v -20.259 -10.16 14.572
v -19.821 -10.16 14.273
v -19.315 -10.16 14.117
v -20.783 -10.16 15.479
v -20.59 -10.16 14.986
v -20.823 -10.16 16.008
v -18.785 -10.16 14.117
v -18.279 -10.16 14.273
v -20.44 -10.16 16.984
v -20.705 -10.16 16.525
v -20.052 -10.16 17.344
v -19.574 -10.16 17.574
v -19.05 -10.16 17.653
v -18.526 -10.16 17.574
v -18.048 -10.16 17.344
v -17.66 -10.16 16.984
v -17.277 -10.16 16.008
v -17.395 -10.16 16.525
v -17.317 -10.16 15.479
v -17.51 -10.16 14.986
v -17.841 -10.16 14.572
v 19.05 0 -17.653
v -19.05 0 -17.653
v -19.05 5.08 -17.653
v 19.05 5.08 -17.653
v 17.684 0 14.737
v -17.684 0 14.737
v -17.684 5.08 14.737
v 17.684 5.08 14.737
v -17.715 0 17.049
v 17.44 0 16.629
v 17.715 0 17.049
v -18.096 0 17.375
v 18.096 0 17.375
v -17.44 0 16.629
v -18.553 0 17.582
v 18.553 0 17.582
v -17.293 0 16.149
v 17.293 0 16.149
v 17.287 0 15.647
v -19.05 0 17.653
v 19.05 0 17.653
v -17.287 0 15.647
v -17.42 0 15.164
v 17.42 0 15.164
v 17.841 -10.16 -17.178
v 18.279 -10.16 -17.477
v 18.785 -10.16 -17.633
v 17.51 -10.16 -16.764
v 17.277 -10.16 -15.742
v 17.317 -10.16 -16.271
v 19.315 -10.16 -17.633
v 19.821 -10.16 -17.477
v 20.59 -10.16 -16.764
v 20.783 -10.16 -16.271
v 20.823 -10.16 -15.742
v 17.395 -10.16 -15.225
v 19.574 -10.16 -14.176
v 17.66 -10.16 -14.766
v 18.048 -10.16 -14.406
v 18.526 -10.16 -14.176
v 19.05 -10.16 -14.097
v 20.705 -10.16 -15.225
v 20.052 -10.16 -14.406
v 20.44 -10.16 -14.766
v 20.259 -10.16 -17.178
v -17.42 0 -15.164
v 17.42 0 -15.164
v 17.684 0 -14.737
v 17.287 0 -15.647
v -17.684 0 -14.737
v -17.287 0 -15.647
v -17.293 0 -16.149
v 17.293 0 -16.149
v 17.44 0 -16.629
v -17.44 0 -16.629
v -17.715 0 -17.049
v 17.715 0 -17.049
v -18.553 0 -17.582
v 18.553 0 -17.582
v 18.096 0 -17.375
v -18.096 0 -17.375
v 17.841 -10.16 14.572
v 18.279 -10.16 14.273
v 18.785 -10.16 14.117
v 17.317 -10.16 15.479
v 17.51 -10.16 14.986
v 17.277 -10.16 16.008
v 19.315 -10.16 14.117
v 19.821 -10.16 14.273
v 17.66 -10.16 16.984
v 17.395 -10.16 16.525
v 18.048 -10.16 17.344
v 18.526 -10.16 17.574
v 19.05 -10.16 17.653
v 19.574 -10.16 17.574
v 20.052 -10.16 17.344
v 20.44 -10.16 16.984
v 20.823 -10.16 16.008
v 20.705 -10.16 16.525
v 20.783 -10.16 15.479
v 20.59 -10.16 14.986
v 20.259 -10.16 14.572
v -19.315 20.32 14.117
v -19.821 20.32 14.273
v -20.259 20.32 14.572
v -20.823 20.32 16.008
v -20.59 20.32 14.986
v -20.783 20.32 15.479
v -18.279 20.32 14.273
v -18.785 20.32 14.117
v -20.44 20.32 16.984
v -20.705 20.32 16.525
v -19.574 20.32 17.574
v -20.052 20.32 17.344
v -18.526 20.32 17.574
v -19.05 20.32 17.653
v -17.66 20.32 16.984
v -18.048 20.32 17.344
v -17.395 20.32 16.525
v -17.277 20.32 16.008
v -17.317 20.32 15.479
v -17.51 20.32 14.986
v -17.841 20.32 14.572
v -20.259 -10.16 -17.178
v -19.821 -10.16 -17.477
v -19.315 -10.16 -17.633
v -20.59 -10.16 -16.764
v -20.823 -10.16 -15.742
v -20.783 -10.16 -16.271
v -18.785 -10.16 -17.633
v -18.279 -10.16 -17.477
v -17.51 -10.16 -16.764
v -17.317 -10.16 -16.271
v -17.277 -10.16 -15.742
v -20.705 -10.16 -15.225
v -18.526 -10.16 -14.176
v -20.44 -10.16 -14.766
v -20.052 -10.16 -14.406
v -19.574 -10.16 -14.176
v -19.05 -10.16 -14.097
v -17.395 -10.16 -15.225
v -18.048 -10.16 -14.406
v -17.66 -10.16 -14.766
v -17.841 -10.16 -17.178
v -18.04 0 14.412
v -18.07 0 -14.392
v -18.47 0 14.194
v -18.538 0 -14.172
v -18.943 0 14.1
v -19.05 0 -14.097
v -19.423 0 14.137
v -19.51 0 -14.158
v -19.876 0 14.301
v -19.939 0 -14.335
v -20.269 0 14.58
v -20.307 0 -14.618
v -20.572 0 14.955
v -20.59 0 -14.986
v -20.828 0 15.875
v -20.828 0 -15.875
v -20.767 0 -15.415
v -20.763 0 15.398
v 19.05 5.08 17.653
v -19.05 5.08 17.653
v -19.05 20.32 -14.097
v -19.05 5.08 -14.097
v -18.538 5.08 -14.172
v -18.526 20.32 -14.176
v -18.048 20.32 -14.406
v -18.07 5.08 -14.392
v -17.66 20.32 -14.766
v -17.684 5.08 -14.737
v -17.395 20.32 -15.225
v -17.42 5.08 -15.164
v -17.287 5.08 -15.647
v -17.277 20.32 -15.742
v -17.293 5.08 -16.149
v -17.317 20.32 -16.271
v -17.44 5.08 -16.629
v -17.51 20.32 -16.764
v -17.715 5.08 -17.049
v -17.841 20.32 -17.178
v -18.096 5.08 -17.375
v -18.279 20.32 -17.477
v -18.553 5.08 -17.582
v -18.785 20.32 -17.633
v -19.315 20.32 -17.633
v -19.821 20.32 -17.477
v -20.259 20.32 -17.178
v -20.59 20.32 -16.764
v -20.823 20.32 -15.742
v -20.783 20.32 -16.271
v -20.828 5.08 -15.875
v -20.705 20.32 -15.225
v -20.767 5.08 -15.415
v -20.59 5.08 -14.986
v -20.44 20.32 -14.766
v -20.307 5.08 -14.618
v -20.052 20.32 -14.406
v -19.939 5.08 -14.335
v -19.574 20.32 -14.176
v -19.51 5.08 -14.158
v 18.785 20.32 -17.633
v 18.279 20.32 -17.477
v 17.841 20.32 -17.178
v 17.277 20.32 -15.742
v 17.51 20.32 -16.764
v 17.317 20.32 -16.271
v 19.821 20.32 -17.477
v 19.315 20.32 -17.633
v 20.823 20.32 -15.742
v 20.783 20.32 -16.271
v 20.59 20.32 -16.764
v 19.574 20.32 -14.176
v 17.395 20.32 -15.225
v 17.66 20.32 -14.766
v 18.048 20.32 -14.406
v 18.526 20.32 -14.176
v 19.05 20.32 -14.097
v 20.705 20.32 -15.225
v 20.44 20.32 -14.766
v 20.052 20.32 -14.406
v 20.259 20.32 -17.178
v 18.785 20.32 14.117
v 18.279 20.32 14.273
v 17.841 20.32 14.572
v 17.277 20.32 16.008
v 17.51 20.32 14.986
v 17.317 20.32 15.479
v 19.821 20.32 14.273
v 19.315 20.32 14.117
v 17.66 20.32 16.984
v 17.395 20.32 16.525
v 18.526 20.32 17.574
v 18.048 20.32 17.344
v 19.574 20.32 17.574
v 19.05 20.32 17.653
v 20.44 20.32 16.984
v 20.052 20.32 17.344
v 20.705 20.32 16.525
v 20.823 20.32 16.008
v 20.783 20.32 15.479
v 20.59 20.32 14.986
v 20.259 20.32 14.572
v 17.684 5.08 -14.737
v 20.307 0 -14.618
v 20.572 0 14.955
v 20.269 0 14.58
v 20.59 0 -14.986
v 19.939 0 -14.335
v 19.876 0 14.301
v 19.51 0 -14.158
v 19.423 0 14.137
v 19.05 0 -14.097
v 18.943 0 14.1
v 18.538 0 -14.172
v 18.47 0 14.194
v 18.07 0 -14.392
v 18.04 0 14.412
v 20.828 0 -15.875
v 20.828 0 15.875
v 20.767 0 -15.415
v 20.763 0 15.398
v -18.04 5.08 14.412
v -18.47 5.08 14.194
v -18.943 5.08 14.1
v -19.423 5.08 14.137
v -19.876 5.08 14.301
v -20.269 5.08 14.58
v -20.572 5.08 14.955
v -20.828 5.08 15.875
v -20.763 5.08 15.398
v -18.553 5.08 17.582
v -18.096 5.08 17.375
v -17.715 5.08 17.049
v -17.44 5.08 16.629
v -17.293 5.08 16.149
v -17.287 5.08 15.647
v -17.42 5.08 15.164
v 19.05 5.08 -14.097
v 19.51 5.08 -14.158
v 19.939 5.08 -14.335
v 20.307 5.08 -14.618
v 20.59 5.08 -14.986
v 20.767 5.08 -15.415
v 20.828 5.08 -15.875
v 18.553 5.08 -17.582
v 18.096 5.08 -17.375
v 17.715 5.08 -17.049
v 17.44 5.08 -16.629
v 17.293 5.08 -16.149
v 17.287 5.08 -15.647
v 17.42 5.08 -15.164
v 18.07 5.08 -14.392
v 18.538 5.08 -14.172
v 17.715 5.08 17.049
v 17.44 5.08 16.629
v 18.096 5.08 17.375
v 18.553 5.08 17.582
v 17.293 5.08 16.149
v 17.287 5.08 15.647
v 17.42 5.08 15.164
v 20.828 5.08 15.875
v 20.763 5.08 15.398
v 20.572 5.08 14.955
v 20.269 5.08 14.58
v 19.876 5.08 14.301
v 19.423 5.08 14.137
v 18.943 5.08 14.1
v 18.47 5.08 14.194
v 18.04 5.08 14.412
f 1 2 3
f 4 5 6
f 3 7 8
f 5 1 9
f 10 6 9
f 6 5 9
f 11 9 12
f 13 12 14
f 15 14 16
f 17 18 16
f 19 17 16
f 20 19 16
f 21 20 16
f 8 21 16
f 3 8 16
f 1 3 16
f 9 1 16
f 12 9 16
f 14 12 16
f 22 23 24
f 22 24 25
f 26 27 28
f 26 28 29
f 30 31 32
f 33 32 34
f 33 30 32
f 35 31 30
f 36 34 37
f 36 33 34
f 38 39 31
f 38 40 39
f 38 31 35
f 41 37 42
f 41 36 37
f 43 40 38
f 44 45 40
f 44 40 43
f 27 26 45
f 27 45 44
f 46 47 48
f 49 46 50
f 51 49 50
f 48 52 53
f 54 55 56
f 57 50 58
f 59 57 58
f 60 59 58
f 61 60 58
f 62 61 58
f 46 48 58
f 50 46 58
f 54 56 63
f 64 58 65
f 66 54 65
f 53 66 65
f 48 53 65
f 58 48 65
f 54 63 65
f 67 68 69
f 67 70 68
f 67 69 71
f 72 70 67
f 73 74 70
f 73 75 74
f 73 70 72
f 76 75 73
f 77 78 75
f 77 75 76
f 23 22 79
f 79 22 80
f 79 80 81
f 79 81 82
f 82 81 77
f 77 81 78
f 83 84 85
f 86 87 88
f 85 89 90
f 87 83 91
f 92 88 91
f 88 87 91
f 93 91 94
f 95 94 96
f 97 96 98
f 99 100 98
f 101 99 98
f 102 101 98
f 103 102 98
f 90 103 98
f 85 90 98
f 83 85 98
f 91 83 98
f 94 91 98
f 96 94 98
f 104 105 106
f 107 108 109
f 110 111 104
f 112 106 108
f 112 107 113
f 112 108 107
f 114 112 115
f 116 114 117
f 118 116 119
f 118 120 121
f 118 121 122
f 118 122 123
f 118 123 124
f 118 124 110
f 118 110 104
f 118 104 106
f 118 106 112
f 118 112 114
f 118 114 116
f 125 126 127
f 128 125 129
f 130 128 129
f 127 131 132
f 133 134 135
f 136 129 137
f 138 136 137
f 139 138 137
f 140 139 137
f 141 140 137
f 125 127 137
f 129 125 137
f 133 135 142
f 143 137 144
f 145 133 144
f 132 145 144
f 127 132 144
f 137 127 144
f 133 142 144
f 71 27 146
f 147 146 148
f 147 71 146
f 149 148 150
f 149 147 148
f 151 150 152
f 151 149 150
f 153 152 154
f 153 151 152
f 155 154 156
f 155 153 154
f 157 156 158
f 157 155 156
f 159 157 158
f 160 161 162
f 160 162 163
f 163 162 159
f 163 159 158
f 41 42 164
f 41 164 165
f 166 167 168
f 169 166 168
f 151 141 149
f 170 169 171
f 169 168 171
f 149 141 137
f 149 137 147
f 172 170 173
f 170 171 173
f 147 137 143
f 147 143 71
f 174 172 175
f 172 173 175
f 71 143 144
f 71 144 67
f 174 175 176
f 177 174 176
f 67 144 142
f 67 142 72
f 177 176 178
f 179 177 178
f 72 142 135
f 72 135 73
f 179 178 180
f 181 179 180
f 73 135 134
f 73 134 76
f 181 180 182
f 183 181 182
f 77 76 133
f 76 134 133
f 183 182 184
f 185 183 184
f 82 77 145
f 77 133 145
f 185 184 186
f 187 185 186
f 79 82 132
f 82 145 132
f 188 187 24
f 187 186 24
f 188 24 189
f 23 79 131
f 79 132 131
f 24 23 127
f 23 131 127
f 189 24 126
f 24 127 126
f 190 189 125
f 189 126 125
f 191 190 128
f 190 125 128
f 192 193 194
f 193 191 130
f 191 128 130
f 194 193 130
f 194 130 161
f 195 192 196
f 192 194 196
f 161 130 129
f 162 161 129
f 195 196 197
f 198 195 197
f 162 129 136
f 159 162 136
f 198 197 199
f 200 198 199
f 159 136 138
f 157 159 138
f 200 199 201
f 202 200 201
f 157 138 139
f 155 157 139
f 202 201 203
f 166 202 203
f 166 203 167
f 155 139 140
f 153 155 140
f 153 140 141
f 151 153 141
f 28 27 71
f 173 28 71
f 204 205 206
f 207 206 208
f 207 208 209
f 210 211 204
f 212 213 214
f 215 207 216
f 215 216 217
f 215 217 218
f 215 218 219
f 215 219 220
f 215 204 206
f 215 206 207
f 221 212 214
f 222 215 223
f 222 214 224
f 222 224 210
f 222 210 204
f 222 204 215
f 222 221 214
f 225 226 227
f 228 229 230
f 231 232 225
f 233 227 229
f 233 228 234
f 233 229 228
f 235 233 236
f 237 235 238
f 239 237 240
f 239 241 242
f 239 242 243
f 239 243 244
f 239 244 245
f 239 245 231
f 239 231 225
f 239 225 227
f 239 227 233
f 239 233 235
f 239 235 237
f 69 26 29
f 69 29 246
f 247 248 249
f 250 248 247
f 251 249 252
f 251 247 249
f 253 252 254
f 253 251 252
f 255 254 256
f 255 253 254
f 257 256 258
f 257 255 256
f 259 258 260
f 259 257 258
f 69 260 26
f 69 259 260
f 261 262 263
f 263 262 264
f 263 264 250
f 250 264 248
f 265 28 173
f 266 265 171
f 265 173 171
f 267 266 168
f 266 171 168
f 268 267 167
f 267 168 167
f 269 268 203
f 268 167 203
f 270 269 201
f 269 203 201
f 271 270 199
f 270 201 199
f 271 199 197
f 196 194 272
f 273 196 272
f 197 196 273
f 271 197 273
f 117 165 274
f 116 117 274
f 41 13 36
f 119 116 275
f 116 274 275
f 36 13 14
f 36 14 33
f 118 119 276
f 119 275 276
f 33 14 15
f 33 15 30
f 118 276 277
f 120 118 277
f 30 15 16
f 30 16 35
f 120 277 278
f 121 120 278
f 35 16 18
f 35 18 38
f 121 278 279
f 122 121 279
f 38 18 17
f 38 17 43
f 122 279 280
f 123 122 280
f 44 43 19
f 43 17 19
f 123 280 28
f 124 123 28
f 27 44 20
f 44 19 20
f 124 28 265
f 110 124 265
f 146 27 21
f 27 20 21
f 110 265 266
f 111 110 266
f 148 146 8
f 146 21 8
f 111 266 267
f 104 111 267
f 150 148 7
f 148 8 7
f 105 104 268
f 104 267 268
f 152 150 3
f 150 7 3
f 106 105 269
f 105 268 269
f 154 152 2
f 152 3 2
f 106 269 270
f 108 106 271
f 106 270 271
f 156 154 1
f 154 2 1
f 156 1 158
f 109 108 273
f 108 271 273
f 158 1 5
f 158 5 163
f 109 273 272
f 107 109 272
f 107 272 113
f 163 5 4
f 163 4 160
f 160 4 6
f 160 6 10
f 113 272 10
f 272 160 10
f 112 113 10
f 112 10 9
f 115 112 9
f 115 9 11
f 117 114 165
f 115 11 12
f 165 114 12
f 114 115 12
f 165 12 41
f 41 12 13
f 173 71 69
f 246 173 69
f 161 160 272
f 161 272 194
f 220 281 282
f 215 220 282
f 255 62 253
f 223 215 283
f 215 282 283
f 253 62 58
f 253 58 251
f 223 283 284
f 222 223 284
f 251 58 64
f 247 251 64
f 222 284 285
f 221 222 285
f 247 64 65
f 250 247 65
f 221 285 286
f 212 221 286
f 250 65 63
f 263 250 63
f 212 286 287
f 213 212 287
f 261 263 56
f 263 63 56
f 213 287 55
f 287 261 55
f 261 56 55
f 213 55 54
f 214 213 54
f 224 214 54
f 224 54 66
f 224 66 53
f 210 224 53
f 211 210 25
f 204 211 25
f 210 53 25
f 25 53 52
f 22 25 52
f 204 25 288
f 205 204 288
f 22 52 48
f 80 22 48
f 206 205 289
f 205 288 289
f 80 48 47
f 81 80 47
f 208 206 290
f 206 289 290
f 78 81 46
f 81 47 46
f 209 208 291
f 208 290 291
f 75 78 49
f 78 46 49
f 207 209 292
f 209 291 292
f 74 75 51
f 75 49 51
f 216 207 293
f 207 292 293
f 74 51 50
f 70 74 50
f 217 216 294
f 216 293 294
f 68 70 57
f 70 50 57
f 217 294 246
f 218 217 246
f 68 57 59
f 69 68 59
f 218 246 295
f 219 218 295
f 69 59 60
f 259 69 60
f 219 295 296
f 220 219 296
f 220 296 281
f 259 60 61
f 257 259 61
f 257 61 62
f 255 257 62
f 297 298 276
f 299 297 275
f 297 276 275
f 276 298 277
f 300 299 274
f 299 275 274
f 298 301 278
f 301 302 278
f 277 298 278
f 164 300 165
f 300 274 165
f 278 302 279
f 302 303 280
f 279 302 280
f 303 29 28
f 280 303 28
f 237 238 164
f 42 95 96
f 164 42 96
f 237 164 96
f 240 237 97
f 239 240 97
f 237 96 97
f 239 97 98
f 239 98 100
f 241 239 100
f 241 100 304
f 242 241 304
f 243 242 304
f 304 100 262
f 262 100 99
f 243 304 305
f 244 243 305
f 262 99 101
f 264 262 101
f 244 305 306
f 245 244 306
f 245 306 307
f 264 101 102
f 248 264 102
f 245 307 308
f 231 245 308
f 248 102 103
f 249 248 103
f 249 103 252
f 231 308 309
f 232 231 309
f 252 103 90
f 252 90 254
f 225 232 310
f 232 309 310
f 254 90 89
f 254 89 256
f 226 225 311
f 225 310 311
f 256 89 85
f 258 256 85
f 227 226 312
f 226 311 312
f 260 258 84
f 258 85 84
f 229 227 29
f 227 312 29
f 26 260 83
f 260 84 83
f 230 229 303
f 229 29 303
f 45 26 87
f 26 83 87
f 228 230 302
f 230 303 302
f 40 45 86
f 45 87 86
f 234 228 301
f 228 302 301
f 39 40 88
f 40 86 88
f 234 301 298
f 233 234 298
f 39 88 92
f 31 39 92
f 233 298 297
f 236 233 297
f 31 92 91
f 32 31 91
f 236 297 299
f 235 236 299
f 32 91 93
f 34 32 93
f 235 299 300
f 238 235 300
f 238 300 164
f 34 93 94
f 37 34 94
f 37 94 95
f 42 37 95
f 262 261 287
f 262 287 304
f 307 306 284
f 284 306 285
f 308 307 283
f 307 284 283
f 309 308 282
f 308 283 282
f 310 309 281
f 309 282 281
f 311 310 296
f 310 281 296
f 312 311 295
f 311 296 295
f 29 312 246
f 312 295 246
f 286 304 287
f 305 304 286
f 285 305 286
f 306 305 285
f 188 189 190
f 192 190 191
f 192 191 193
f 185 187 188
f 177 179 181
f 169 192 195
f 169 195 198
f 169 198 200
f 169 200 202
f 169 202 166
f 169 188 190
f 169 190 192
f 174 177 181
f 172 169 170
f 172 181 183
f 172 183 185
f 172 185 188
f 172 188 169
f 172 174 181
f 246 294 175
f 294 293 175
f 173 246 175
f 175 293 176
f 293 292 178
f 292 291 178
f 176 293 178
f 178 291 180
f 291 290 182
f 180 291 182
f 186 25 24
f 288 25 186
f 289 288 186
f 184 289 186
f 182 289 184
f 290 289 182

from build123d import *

# Parameters (mm, degrees)
SKETCH2_W                = 35.36820513
SKETCH2_H                = 29.473504274
BOSS_EXTRUDE1_DEPTH      = 5.08
BOSS_EXTRUDE2_DEPTH      = 15.24
BOSS_EXTRUDE2_DEPTH_BACK = 15.24
SKETCH3_R                = 1.778


with BuildPart() as part:
    # Sketch2 → Boss-Extrude1 (new body)
    with BuildSketch(Plane(origin=(0, 0, 0), x_dir=(1, 0, 0), z_dir=(0, 1, 0))):
        with BuildLine():
            Line((-20.828, -15.875), (-20.828, 15.875))
            ThreePointArc((-20.828, 15.875), (-20.307235857, 17.132235857), (-19.05, 17.653))
            Line((-19.05, 17.653), (19.05, 17.653))
            ThreePointArc((19.05, 17.653), (20.307235857, 17.132235857), (20.828, 15.875))
            Line((20.828, 15.875), (20.828, -15.875))
            ThreePointArc((20.828, -15.875), (20.307235857, -17.132235857), (19.05, -17.653))
            Line((19.05, -17.653), (-19.05, -17.653))
            ThreePointArc((-19.05, -17.653), (-20.307235857, -17.132235857), (-20.828, -15.875))
        make_face()
        Rectangle(SKETCH2_W, SKETCH2_H, mode=Mode.SUBTRACT)
    extrude(amount=BOSS_EXTRUDE1_DEPTH)

    # Sketch3 → Boss-Extrude2 (add, two sides: drawn at the far end of the back side and taken through both)
    with BuildSketch(Plane(origin=(0, 5.08, 0), x_dir=(1, 0, 0), z_dir=(0, 1, 0)).offset(-BOSS_EXTRUDE2_DEPTH_BACK)):
        with Locations(Location((-19.05, -15.875, 0), (0, 0, 270))):
            Circle(SKETCH3_R)
        with Locations(Location((19.05, -15.875, 0), (0, 0, 270))):
            Circle(SKETCH3_R)
        with Locations(Location((19.05, 15.875, 0), (0, 0, 270))):
            Circle(SKETCH3_R)
        with Locations(Location((-19.05, 15.875, 0), (0, 0, 270))):
            Circle(SKETCH3_R)
    extrude(amount=BOSS_EXTRUDE2_DEPTH + BOSS_EXTRUDE2_DEPTH_BACK)


solid = part.part
